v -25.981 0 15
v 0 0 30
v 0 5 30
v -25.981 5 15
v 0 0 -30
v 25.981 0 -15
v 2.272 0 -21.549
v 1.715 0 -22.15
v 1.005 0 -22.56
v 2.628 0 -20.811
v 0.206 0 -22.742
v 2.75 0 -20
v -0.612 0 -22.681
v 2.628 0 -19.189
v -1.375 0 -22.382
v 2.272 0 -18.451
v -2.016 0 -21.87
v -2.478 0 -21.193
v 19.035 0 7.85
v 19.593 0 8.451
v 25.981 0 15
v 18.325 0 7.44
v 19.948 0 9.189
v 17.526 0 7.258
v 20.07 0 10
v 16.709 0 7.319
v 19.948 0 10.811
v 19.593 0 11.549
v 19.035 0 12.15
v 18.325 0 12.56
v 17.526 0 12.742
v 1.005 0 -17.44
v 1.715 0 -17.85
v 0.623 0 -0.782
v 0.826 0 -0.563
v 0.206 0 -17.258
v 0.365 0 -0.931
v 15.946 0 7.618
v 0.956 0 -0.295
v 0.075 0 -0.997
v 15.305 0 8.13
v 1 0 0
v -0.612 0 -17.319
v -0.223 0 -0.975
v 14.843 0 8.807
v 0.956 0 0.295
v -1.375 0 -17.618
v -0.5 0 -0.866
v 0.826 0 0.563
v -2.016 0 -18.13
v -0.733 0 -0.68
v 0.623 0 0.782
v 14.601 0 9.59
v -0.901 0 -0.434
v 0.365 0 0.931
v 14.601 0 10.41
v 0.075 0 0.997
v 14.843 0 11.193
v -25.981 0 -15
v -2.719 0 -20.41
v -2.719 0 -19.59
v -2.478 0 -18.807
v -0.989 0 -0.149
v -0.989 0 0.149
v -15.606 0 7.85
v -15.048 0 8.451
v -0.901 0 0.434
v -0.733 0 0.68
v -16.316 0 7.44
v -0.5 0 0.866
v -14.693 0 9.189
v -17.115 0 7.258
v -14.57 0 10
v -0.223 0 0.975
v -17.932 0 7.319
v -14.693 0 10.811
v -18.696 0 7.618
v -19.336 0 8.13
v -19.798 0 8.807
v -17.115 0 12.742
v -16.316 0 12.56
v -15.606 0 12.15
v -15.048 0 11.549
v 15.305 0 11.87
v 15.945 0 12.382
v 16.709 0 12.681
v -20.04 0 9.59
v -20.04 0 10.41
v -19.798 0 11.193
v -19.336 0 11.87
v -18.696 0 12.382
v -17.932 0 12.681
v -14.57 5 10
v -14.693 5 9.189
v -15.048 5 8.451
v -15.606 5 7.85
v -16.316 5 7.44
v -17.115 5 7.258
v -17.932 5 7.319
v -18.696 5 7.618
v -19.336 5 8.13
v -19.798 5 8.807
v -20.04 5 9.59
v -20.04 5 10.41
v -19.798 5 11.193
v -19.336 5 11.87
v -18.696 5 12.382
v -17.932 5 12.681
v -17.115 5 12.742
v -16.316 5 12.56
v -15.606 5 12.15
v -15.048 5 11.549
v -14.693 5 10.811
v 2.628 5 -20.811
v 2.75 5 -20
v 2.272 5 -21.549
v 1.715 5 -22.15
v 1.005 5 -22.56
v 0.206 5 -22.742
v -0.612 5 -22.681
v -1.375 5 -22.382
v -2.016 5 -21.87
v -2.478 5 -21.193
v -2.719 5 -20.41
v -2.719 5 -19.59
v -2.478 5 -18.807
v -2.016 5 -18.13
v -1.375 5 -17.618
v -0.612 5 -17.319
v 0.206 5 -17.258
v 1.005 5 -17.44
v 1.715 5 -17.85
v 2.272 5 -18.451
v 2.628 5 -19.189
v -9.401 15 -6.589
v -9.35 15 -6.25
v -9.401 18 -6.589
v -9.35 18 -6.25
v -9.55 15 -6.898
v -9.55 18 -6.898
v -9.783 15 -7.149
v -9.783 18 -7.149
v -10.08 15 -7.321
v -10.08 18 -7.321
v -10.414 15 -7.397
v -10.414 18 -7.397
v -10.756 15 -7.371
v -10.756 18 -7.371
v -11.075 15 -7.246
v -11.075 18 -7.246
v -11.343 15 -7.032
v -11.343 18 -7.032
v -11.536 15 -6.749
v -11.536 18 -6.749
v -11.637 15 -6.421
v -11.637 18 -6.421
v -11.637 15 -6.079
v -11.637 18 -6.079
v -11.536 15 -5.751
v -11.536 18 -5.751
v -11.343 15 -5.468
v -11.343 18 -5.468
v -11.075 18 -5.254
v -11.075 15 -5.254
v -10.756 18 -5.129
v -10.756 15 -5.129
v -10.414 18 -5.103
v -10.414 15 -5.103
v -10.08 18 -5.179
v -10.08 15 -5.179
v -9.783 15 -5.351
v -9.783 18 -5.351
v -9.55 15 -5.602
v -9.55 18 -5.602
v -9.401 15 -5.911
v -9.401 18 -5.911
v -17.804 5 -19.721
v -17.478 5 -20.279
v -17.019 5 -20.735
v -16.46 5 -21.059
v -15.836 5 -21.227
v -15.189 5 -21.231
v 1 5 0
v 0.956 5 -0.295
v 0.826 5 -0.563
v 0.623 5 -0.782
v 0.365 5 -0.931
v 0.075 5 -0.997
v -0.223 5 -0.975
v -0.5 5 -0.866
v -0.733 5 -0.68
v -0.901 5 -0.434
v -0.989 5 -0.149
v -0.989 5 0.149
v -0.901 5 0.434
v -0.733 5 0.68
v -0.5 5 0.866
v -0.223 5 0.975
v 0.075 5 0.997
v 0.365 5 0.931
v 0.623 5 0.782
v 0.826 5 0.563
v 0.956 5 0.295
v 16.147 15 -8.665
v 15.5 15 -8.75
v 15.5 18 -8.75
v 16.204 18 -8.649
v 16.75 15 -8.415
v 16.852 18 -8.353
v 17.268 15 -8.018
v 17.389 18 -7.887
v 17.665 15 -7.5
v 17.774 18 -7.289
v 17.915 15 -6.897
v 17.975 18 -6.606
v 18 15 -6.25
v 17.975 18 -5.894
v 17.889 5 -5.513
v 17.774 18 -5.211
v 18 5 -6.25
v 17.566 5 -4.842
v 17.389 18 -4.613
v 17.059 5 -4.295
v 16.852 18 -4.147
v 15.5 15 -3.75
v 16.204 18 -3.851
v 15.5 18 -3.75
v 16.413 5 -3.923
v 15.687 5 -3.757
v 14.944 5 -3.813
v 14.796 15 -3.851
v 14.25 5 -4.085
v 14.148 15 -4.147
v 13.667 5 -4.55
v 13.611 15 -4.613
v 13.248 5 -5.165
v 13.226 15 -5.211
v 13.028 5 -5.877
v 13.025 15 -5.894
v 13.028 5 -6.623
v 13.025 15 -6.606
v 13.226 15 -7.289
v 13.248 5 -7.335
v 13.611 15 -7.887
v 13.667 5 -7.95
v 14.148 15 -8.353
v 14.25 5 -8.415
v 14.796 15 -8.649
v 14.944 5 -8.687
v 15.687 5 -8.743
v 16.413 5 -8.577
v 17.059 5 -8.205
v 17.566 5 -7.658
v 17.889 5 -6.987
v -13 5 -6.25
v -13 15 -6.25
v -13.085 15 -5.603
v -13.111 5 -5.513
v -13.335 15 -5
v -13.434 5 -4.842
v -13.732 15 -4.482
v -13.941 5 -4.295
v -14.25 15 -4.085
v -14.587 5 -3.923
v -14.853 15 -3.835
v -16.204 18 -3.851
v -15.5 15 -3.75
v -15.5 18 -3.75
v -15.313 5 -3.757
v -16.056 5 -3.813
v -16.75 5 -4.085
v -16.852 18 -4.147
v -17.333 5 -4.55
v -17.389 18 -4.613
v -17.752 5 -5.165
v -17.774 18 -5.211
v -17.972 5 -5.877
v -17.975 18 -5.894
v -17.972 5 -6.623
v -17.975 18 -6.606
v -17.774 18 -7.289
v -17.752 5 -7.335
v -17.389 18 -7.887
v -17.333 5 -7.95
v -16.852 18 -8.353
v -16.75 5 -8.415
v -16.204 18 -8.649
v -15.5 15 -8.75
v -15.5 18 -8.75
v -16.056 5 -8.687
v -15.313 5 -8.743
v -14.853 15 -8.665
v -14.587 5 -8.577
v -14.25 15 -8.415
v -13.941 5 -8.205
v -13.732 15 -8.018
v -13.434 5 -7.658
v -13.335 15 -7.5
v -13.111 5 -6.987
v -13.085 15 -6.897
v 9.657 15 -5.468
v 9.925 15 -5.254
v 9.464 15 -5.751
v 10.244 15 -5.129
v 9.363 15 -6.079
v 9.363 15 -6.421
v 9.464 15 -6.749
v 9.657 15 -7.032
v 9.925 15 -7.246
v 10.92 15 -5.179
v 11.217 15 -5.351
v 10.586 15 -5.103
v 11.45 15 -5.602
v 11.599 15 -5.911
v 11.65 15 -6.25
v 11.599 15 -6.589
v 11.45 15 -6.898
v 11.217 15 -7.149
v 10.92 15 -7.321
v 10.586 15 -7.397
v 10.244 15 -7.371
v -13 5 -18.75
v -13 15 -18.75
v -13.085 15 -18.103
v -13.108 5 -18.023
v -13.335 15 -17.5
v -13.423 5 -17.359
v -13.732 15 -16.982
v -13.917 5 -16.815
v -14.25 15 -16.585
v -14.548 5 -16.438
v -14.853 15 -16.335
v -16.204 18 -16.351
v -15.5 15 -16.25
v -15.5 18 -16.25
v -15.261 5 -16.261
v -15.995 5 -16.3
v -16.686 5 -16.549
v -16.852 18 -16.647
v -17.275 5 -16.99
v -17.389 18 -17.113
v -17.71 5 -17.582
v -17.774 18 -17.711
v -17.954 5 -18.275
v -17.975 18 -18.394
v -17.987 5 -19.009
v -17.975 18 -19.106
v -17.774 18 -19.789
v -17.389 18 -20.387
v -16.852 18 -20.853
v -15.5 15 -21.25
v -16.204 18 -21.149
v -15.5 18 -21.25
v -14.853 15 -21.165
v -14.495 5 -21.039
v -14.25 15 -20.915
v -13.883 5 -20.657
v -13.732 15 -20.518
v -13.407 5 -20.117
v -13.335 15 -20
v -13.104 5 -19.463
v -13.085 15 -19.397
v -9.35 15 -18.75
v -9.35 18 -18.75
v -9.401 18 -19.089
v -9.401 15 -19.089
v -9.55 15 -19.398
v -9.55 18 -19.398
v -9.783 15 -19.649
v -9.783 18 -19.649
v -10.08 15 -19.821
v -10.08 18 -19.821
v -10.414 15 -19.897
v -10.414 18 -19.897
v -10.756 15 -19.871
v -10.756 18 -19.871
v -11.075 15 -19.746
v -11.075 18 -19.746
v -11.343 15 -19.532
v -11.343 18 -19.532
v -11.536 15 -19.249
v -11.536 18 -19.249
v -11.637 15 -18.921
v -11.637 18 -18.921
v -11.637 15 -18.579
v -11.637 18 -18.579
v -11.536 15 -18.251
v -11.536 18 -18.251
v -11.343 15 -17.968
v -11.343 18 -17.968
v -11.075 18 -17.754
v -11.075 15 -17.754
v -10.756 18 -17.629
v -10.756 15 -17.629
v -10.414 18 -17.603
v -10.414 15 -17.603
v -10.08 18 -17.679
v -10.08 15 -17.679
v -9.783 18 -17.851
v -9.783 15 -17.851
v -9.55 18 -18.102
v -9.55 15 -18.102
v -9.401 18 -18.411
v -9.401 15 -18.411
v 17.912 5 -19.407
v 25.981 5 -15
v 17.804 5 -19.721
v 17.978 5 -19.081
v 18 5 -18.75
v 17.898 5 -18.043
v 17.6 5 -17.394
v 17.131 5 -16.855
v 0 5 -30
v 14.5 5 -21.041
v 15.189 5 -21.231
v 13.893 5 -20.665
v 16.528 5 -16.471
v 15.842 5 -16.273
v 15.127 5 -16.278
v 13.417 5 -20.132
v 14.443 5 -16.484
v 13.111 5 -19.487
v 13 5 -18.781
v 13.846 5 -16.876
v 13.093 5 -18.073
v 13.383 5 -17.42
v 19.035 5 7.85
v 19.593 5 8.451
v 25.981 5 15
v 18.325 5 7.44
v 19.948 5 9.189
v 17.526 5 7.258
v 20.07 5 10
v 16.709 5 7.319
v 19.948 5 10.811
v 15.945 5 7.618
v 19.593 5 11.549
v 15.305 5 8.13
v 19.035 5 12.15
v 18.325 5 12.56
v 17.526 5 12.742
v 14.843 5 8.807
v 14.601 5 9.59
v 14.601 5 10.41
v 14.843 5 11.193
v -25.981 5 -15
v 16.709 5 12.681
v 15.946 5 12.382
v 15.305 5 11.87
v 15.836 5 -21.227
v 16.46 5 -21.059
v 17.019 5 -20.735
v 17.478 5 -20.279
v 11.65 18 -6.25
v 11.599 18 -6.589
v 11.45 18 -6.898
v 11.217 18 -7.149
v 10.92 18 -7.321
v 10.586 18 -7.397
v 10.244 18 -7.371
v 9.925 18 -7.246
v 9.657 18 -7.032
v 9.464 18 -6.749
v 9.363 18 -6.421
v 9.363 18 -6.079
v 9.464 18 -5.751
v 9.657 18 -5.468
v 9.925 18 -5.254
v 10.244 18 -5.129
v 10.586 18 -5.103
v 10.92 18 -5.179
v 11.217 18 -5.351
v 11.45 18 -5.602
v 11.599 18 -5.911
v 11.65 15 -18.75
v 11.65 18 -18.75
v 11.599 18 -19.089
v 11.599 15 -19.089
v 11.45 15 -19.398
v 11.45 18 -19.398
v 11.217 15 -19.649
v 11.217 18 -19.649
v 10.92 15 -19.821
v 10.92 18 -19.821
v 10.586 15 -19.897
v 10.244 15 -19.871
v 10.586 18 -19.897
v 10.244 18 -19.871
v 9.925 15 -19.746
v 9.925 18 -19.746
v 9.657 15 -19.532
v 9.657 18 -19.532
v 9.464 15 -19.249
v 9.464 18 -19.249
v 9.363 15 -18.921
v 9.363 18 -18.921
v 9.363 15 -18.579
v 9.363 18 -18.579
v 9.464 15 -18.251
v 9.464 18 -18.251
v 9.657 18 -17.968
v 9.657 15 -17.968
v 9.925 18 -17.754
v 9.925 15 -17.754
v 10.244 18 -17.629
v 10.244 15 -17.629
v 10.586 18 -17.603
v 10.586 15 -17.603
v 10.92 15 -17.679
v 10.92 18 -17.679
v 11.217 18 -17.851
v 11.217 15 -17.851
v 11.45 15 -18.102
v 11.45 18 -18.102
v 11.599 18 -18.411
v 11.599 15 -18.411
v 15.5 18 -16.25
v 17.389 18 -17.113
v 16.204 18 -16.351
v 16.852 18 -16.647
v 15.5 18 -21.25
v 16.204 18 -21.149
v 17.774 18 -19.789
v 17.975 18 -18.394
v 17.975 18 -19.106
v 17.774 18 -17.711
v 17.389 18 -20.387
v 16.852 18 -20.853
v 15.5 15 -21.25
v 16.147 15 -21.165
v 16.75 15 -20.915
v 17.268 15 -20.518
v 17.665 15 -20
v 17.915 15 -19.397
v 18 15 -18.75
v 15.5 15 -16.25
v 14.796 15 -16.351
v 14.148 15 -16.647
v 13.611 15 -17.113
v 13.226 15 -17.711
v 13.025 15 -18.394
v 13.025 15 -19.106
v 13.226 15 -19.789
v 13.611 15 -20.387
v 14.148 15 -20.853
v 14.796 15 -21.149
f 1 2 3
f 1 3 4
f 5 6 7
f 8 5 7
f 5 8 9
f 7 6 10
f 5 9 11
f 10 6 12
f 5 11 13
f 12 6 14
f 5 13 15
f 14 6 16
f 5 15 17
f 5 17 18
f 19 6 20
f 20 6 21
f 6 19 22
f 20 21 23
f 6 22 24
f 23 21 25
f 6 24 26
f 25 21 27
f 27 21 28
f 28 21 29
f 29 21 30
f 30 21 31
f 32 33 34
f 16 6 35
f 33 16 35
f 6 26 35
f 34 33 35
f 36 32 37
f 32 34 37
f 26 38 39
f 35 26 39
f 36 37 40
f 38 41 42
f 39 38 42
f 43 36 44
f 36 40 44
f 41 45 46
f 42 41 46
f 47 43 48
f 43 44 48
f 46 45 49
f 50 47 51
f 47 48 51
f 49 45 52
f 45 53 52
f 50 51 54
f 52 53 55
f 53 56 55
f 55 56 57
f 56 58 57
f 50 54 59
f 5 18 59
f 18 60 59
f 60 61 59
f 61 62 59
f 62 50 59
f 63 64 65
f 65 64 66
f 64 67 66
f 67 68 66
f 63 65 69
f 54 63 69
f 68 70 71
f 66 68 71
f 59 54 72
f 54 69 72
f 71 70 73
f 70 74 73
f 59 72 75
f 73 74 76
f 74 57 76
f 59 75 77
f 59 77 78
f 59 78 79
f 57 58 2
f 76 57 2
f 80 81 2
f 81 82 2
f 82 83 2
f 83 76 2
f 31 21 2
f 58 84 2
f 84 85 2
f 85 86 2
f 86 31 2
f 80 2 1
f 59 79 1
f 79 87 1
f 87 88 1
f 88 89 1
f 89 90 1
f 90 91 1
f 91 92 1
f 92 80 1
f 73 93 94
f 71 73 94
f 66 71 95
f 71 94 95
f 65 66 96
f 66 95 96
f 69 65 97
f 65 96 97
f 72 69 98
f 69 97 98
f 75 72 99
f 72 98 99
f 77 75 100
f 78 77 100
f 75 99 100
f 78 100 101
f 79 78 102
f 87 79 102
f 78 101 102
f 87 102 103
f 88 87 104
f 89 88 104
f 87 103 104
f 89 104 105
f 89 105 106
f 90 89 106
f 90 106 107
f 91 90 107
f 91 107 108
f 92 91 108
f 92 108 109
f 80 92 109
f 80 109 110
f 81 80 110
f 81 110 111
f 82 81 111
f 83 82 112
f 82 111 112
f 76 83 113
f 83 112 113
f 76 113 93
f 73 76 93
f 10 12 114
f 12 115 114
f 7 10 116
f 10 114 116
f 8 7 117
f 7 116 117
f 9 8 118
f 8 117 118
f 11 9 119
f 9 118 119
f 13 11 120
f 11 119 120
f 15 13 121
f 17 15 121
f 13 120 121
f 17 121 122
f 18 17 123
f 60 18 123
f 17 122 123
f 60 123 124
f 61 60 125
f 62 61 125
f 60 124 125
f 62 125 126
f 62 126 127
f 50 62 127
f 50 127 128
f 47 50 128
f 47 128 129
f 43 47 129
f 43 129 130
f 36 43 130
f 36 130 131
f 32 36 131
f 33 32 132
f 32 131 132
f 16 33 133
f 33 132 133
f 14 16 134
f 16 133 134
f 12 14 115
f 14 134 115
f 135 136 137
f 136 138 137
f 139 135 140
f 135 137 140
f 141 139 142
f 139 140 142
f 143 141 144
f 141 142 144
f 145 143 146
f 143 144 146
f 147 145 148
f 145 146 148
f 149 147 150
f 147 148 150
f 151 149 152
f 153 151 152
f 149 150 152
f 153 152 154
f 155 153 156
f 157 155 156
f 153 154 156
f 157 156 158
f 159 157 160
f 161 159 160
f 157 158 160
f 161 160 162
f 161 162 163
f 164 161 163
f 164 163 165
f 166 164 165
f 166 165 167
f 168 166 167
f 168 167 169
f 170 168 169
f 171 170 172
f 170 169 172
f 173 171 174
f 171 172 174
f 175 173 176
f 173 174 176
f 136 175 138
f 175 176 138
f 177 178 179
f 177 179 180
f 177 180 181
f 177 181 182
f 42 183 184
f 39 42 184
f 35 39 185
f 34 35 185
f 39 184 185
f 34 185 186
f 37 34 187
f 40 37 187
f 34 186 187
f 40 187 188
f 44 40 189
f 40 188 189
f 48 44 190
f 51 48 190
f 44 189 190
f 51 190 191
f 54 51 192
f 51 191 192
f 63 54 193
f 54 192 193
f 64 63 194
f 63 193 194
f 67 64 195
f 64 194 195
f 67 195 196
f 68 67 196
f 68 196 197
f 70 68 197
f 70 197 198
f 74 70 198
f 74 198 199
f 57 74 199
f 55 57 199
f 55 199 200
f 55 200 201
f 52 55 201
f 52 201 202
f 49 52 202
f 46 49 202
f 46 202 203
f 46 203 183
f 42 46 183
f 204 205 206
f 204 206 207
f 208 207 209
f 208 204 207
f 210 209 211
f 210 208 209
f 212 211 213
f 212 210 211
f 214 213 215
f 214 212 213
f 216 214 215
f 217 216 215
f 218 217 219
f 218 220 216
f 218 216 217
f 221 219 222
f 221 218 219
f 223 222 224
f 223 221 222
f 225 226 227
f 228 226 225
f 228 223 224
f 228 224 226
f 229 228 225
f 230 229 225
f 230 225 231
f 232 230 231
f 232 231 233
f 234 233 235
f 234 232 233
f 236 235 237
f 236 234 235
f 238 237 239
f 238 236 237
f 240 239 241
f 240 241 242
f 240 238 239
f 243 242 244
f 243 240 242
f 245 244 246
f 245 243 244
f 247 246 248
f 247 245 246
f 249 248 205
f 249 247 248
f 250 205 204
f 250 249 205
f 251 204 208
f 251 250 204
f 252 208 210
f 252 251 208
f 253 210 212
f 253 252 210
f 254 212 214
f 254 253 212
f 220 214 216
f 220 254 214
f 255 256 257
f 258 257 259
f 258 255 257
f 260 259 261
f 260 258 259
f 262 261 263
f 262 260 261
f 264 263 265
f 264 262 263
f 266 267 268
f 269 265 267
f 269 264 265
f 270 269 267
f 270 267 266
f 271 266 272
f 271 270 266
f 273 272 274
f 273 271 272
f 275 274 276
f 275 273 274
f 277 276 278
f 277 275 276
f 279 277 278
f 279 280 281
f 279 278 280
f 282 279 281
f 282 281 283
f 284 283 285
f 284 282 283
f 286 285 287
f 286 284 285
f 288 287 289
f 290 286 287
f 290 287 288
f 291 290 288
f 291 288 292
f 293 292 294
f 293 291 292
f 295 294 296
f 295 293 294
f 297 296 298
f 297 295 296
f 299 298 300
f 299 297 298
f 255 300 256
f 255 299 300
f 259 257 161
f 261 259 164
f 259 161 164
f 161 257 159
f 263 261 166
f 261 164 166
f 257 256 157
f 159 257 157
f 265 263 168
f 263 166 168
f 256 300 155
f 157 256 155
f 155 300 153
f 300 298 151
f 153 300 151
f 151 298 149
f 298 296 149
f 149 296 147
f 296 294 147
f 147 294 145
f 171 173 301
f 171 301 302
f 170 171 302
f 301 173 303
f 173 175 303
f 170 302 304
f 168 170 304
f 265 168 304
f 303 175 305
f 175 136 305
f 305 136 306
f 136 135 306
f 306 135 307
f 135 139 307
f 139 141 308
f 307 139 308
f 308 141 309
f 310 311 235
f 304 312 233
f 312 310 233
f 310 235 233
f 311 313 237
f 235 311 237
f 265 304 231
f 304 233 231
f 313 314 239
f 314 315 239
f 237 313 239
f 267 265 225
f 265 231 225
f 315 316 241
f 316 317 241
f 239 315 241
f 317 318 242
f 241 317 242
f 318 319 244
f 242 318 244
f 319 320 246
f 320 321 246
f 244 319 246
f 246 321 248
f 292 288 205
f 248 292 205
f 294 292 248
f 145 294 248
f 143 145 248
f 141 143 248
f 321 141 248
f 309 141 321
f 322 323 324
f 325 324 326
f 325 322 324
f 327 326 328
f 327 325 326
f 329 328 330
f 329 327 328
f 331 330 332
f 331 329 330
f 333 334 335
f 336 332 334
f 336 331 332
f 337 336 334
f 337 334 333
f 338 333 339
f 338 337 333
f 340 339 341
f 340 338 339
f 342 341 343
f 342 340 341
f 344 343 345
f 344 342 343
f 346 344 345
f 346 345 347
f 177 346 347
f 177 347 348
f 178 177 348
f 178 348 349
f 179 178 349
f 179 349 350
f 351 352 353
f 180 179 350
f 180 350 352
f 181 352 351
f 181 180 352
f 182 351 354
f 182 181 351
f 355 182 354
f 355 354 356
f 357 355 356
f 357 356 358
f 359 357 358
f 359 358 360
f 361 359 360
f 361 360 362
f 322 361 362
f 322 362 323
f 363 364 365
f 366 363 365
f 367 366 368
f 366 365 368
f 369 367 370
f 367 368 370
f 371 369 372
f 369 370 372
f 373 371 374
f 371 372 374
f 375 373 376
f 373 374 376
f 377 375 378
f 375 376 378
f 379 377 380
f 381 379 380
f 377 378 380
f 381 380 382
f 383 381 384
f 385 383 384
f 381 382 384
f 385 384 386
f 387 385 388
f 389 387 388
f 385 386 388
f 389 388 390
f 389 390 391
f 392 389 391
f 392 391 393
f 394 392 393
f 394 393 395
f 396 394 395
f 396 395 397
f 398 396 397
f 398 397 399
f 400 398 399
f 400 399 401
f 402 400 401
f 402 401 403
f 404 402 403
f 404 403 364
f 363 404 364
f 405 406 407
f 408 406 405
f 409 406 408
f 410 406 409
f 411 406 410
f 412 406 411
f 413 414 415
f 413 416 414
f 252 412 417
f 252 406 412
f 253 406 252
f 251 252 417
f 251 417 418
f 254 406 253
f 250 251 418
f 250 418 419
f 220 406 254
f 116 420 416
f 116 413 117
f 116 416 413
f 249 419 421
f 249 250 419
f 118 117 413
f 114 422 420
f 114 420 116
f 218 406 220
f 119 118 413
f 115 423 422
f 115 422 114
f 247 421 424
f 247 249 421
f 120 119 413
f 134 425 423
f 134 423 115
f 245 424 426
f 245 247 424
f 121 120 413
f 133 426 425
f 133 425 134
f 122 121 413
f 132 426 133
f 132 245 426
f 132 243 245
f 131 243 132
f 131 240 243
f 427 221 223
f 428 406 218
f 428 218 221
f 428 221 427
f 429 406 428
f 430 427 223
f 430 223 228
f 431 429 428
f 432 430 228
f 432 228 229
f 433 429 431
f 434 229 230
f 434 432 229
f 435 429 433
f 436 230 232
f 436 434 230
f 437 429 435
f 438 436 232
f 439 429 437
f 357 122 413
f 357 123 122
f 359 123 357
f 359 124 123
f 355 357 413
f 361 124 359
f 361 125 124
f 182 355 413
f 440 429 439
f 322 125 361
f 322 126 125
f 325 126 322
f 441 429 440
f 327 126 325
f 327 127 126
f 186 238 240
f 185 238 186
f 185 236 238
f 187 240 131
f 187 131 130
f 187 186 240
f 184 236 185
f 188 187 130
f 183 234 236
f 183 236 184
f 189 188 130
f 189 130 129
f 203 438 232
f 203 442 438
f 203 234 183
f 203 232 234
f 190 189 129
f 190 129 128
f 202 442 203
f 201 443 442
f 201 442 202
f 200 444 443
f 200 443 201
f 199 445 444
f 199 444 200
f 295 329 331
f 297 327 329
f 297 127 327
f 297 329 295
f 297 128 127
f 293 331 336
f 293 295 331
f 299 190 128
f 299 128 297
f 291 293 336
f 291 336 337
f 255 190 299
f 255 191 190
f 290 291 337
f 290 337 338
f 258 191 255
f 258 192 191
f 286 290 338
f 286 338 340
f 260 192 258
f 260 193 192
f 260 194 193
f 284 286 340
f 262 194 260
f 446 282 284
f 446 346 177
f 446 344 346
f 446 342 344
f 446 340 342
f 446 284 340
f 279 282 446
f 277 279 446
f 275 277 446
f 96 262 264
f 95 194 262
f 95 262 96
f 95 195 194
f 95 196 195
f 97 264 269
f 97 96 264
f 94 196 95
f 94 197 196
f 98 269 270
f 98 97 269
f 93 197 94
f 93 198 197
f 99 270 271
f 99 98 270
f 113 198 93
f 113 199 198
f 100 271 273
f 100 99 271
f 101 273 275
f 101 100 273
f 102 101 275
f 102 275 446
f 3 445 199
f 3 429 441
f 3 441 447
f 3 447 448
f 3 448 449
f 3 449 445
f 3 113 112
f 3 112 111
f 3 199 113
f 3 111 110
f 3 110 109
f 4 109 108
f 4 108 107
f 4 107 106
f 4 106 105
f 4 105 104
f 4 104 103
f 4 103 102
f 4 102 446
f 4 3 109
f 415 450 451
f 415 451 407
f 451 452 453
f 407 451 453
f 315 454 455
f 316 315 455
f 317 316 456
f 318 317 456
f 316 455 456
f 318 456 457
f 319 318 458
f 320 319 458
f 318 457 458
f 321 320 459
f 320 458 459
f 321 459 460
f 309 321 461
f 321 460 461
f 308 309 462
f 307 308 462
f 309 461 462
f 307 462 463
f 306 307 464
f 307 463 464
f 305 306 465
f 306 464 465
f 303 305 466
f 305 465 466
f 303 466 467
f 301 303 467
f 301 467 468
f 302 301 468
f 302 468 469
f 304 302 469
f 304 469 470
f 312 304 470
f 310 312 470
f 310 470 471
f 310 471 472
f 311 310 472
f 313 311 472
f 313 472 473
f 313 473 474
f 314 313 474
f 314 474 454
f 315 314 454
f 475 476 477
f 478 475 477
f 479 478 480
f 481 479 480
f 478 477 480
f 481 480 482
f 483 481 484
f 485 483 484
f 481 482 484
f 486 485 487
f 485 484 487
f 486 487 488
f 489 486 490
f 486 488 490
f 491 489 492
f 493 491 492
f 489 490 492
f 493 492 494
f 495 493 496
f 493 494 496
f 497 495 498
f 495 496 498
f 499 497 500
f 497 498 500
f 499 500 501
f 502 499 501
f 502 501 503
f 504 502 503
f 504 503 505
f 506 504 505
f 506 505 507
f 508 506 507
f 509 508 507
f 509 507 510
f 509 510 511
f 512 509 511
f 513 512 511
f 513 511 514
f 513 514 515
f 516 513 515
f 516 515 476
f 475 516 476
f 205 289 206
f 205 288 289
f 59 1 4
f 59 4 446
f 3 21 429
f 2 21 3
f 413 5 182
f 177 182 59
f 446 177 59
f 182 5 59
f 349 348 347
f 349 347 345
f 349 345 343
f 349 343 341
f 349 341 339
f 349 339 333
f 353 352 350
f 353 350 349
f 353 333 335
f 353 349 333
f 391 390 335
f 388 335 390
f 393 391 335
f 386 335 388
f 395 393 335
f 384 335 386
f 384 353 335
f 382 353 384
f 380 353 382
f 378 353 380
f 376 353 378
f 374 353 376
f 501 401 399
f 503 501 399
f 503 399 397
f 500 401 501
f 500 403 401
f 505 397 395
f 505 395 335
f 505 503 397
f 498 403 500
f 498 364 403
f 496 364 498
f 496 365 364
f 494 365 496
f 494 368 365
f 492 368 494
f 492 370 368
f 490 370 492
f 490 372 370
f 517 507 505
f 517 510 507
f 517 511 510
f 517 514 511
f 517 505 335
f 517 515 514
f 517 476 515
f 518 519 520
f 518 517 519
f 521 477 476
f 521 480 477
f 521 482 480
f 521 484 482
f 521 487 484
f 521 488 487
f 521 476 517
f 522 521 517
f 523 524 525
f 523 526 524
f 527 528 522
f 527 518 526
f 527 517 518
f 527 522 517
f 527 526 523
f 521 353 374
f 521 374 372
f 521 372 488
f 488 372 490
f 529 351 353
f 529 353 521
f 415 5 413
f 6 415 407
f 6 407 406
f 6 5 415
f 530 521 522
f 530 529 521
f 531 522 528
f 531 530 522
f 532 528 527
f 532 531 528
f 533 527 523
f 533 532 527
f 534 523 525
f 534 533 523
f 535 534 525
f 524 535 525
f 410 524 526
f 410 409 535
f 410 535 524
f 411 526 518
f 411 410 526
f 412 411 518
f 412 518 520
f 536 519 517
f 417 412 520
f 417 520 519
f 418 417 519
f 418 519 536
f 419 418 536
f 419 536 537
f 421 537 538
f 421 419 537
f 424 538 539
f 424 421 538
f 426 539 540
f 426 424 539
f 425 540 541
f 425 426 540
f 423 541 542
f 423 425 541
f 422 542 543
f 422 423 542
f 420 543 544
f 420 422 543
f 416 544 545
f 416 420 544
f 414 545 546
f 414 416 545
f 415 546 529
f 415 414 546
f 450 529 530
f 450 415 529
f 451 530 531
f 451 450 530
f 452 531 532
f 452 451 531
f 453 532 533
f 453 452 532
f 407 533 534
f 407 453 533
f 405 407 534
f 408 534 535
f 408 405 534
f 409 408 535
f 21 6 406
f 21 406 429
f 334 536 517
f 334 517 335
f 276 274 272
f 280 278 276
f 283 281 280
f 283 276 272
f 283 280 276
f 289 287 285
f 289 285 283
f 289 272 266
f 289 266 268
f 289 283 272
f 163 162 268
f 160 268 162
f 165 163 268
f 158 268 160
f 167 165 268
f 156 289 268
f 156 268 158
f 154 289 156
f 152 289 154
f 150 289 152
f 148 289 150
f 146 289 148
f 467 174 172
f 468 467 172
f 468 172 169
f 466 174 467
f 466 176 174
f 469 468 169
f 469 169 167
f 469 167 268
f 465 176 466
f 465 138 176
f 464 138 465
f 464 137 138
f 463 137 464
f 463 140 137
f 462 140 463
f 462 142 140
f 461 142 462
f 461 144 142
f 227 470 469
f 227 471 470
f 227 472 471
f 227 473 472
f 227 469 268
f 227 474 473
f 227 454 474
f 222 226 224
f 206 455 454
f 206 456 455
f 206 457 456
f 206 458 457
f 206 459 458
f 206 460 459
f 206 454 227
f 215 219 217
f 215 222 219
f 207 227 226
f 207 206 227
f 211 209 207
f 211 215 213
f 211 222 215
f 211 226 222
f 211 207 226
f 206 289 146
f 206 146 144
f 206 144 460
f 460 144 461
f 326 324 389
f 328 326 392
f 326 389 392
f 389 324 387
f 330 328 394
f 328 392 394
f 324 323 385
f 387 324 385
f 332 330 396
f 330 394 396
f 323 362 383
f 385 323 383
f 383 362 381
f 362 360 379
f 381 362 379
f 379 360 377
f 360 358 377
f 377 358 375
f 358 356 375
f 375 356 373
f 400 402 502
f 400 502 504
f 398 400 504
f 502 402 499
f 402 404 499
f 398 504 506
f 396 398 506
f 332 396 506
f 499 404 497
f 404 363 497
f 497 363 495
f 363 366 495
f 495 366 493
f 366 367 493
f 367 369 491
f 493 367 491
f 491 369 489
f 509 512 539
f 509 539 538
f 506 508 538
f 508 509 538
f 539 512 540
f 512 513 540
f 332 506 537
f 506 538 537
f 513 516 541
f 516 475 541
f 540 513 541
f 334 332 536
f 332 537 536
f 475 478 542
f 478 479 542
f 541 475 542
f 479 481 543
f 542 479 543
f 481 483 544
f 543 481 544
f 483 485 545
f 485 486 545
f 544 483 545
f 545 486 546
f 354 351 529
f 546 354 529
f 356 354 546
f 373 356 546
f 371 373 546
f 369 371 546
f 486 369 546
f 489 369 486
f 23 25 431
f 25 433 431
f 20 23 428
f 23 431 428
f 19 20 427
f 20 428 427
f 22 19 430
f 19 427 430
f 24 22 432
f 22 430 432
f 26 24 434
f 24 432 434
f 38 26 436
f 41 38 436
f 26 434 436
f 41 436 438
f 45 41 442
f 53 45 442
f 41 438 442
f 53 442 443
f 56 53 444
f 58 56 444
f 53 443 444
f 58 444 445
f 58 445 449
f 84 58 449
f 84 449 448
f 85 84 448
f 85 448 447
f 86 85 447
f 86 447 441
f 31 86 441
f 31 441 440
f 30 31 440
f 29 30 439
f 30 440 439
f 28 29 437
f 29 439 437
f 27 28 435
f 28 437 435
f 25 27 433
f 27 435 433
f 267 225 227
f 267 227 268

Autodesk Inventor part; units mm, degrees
ref_plane "YZ Plane" through (0, 0, 0) normal (1, 0, 0) x (0, 1, 0)
ref_plane "XZ Plane" through (0, 0, 0) normal (0, 1, 0) x (-1, 0, 0)
ref_plane "XY Plane" through (0, 0, 0) normal (0, 0, 1) x (1, 0, 0)
sketch "Sketch1" plane through (0, 0, 0) normal (0, 1, 0) x (-1, 0, 0)
  line L0 (0, 0) -> (0, -30)
  circle A0 centre (0, 0) radius 30
  line L1 (0, -30) -> (-25.9808, -15)
  line L2 (0, -30) -> (30, -30) construction
  line L3 (-25.9808, -15) -> (-25.9808, 15)
  line L4 (-25.9808, -15) -> (4.0192, -15) construction
  line L5 (-25.9808, 15) -> (0, 30)
  line L6 (0, 30) -> (25.9808, 15)
  line L7 (25.9808, 15) -> (25.9808, -15)
  line L8 (0, -30) -> (25.9808, -15)
  dimension "d0" = 30
  dimension "d1" = 150
  dimension "d3" = 30
  dimension "d4" = 90
  dimension "d5" = 30
  dimension "d6" = 120
  dimension "d7" = 25.9808
extrude "Extrusion1" add sketch "Sketch1" along normal blind 5 contours L7 L8 L1 L3 L5 L6
sketch "Sketch2" plane through (0, 5, 0) normal (0, 1, 0) x (1, 0, 0)
  line L0 (0, 0) -> (0, 20)
  circle A0 centre (0, 20) radius 2.75
  line L1 (0, 0) -> (17.3205, -10)
  line L2 (0, 0) -> (20, 0) construction
  line L3 (0, 0) -> (-17.3205, -10)
  line L4 (0, 0) -> (20, 0) construction
  circle A1 centre (-17.3205, -10) radius 2.75
  circle A2 centre (17.3205, -10) radius 2.75
  dimension "d10" = 20
  dimension "d11" = 5.5
  dimension "d12" = 20
  dimension "d13" = 30
  dimension "d14" = 20
  dimension "d15" = 150
  dimension "d16" = 5.5
  dimension "d17" = 5.5
extrude "Extrusion2" cut sketch "Sketch2" against normal blind 10
sketch "Sketch3" plane through (0, 5, 0) normal (0, 1, 0) x (1, 0, 0)
  line L0 (0, 0) -> (0, 12.5)
  line L1 (10.5, 6.25) -> (-10.5, 6.25)
  line L2 (-10.5, 6.25) -> (-10.5, 18.75)
  line L3 (-10.5, 18.75) -> (10.5, 18.75)
  line L4 (10.5, 18.75) -> (10.5, 6.25)
  line L5 (10.5, 6.25) -> (-10.5, 18.75) construction
  line L6 (-10.5, 6.25) -> (10.5, 18.75) construction
  line L7 (-10.5, 18.75) -> (-15.5, 18.75)
  line L8 (-10.5, 6.25) -> (-15.5, 6.25)
  line L9 (10.5, 18.75) -> (15.5, 18.75)
  line L10 (10.5, 18.75) -> (15.5, 18.75) construction
  line L11 (10.5, 6.25) -> (15.5, 6.25)
  circle A0 centre (-15.5, 18.75) radius 2.5
  circle A1 centre (-15.5, 6.25) radius 2.5
  circle A2 centre (15.5, 18.75) radius 2.5
  circle A3 centre (15.5, 6.25) radius 2.5
  dimension "d20" = 12.5
  dimension "d21" = 21
  dimension "d22" = 12.5
  dimension "d29" = 5
  dimension "d30" = 5
  dimension "d31" = 5
  dimension "d32" = 0
  dimension "d33" = 5
  dimension "d34" = 5
  dimension "d35" = 5
  dimension "d36" = 5
  dimension "d37" = 5
extrude "Extrusion4" add sketch "Sketch3" along normal blind 10 contours A1 | A0 | A2 | A3
sketch "Sketch4" plane through (-15.5, 15, -18.75) normal (0, 1, 0) x (1, 0, 0)
  circle A0 centre (0, 0) radius 2.5 projected
  line L0 (0, 2.5) -> (31, 2.5)
  line L1 (31, 2.5) -> (31, -2.5)
  line L2 (31, -2.5) -> (0, -2.5)
  line L3 (0, -2.5) -> (0, 2.5)
  circle A1 centre (0, -12.5) radius 2.5 projected
  line L4 (0, -10) -> (31, -10)
  line L5 (31, -10) -> (31, -15)
  line L6 (31, -15) -> (0, -15)
  line L7 (0, -15) -> (0, -10)
  circle A2 centre (31, -12.5) radius 2.5 projected
  circle A3 centre (31, 0) radius 2.5 projected
  point P0 (15.5, -18.75)
  dimension "d40" = 31
  dimension "d41" = 5
  dimension "d42" = 2.5
  dimension "d43" = 31
  dimension "d44" = 5
  dimension "d49" = 2.5
extrude "Extrusion5" add sketch "Sketch4" along normal blind 3
sketch "Sketch5" plane through (-15.5, 18, -18.75) normal (0, 1, 0) x (1, 0, 0)
  circle A0 centre (0, 0) radius 2.5 projected
  line L0 (0, 0) -> (5, 0)
  arc A1 (31, -2.5) -> (31, 2.5) centre (31, 0) ccw projected
  line L1 (31, 0) -> (26, 0)
  circle A2 centre (0, -12.5) radius 2.5 projected
  line L2 (0, -12.5) -> (5, -12.5)
  circle A3 centre (31, -12.5) radius 2.5 projected
  line L3 (31, -12.5) -> (26, -12.5)
  circle A4 centre (5, 0) radius 1.15
  circle A5 centre (26, 0) radius 1.15
  circle A6 centre (5, -12.5) radius 1.15
  circle A7 centre (26, -12.5) radius 1.15
  point P0 (15.5, -18.75)
  dimension "d52" = 5
  dimension "d53" = 5
  dimension "d54" = 5
  dimension "d55" = 5
  dimension "d56" = 2.3
  dimension "d57" = 2.3
  dimension "d58" = 2.3
  dimension "d59" = 2.3
extrude "Extrusion6" cut sketch "Sketch5" against normal blind 3 contours A4 | A6 | A7 | A5
sketch "Sketch6" plane through (0, 5, 0) normal (0, 1, 0) x (1, 0, 0)
  circle A0 centre (0, 0) radius 1
  dimension "d62" = 2
extrude "Extrusion7" cut sketch "Sketch6" against normal blind 10
properties part number "80_20_Connector_Bot"
